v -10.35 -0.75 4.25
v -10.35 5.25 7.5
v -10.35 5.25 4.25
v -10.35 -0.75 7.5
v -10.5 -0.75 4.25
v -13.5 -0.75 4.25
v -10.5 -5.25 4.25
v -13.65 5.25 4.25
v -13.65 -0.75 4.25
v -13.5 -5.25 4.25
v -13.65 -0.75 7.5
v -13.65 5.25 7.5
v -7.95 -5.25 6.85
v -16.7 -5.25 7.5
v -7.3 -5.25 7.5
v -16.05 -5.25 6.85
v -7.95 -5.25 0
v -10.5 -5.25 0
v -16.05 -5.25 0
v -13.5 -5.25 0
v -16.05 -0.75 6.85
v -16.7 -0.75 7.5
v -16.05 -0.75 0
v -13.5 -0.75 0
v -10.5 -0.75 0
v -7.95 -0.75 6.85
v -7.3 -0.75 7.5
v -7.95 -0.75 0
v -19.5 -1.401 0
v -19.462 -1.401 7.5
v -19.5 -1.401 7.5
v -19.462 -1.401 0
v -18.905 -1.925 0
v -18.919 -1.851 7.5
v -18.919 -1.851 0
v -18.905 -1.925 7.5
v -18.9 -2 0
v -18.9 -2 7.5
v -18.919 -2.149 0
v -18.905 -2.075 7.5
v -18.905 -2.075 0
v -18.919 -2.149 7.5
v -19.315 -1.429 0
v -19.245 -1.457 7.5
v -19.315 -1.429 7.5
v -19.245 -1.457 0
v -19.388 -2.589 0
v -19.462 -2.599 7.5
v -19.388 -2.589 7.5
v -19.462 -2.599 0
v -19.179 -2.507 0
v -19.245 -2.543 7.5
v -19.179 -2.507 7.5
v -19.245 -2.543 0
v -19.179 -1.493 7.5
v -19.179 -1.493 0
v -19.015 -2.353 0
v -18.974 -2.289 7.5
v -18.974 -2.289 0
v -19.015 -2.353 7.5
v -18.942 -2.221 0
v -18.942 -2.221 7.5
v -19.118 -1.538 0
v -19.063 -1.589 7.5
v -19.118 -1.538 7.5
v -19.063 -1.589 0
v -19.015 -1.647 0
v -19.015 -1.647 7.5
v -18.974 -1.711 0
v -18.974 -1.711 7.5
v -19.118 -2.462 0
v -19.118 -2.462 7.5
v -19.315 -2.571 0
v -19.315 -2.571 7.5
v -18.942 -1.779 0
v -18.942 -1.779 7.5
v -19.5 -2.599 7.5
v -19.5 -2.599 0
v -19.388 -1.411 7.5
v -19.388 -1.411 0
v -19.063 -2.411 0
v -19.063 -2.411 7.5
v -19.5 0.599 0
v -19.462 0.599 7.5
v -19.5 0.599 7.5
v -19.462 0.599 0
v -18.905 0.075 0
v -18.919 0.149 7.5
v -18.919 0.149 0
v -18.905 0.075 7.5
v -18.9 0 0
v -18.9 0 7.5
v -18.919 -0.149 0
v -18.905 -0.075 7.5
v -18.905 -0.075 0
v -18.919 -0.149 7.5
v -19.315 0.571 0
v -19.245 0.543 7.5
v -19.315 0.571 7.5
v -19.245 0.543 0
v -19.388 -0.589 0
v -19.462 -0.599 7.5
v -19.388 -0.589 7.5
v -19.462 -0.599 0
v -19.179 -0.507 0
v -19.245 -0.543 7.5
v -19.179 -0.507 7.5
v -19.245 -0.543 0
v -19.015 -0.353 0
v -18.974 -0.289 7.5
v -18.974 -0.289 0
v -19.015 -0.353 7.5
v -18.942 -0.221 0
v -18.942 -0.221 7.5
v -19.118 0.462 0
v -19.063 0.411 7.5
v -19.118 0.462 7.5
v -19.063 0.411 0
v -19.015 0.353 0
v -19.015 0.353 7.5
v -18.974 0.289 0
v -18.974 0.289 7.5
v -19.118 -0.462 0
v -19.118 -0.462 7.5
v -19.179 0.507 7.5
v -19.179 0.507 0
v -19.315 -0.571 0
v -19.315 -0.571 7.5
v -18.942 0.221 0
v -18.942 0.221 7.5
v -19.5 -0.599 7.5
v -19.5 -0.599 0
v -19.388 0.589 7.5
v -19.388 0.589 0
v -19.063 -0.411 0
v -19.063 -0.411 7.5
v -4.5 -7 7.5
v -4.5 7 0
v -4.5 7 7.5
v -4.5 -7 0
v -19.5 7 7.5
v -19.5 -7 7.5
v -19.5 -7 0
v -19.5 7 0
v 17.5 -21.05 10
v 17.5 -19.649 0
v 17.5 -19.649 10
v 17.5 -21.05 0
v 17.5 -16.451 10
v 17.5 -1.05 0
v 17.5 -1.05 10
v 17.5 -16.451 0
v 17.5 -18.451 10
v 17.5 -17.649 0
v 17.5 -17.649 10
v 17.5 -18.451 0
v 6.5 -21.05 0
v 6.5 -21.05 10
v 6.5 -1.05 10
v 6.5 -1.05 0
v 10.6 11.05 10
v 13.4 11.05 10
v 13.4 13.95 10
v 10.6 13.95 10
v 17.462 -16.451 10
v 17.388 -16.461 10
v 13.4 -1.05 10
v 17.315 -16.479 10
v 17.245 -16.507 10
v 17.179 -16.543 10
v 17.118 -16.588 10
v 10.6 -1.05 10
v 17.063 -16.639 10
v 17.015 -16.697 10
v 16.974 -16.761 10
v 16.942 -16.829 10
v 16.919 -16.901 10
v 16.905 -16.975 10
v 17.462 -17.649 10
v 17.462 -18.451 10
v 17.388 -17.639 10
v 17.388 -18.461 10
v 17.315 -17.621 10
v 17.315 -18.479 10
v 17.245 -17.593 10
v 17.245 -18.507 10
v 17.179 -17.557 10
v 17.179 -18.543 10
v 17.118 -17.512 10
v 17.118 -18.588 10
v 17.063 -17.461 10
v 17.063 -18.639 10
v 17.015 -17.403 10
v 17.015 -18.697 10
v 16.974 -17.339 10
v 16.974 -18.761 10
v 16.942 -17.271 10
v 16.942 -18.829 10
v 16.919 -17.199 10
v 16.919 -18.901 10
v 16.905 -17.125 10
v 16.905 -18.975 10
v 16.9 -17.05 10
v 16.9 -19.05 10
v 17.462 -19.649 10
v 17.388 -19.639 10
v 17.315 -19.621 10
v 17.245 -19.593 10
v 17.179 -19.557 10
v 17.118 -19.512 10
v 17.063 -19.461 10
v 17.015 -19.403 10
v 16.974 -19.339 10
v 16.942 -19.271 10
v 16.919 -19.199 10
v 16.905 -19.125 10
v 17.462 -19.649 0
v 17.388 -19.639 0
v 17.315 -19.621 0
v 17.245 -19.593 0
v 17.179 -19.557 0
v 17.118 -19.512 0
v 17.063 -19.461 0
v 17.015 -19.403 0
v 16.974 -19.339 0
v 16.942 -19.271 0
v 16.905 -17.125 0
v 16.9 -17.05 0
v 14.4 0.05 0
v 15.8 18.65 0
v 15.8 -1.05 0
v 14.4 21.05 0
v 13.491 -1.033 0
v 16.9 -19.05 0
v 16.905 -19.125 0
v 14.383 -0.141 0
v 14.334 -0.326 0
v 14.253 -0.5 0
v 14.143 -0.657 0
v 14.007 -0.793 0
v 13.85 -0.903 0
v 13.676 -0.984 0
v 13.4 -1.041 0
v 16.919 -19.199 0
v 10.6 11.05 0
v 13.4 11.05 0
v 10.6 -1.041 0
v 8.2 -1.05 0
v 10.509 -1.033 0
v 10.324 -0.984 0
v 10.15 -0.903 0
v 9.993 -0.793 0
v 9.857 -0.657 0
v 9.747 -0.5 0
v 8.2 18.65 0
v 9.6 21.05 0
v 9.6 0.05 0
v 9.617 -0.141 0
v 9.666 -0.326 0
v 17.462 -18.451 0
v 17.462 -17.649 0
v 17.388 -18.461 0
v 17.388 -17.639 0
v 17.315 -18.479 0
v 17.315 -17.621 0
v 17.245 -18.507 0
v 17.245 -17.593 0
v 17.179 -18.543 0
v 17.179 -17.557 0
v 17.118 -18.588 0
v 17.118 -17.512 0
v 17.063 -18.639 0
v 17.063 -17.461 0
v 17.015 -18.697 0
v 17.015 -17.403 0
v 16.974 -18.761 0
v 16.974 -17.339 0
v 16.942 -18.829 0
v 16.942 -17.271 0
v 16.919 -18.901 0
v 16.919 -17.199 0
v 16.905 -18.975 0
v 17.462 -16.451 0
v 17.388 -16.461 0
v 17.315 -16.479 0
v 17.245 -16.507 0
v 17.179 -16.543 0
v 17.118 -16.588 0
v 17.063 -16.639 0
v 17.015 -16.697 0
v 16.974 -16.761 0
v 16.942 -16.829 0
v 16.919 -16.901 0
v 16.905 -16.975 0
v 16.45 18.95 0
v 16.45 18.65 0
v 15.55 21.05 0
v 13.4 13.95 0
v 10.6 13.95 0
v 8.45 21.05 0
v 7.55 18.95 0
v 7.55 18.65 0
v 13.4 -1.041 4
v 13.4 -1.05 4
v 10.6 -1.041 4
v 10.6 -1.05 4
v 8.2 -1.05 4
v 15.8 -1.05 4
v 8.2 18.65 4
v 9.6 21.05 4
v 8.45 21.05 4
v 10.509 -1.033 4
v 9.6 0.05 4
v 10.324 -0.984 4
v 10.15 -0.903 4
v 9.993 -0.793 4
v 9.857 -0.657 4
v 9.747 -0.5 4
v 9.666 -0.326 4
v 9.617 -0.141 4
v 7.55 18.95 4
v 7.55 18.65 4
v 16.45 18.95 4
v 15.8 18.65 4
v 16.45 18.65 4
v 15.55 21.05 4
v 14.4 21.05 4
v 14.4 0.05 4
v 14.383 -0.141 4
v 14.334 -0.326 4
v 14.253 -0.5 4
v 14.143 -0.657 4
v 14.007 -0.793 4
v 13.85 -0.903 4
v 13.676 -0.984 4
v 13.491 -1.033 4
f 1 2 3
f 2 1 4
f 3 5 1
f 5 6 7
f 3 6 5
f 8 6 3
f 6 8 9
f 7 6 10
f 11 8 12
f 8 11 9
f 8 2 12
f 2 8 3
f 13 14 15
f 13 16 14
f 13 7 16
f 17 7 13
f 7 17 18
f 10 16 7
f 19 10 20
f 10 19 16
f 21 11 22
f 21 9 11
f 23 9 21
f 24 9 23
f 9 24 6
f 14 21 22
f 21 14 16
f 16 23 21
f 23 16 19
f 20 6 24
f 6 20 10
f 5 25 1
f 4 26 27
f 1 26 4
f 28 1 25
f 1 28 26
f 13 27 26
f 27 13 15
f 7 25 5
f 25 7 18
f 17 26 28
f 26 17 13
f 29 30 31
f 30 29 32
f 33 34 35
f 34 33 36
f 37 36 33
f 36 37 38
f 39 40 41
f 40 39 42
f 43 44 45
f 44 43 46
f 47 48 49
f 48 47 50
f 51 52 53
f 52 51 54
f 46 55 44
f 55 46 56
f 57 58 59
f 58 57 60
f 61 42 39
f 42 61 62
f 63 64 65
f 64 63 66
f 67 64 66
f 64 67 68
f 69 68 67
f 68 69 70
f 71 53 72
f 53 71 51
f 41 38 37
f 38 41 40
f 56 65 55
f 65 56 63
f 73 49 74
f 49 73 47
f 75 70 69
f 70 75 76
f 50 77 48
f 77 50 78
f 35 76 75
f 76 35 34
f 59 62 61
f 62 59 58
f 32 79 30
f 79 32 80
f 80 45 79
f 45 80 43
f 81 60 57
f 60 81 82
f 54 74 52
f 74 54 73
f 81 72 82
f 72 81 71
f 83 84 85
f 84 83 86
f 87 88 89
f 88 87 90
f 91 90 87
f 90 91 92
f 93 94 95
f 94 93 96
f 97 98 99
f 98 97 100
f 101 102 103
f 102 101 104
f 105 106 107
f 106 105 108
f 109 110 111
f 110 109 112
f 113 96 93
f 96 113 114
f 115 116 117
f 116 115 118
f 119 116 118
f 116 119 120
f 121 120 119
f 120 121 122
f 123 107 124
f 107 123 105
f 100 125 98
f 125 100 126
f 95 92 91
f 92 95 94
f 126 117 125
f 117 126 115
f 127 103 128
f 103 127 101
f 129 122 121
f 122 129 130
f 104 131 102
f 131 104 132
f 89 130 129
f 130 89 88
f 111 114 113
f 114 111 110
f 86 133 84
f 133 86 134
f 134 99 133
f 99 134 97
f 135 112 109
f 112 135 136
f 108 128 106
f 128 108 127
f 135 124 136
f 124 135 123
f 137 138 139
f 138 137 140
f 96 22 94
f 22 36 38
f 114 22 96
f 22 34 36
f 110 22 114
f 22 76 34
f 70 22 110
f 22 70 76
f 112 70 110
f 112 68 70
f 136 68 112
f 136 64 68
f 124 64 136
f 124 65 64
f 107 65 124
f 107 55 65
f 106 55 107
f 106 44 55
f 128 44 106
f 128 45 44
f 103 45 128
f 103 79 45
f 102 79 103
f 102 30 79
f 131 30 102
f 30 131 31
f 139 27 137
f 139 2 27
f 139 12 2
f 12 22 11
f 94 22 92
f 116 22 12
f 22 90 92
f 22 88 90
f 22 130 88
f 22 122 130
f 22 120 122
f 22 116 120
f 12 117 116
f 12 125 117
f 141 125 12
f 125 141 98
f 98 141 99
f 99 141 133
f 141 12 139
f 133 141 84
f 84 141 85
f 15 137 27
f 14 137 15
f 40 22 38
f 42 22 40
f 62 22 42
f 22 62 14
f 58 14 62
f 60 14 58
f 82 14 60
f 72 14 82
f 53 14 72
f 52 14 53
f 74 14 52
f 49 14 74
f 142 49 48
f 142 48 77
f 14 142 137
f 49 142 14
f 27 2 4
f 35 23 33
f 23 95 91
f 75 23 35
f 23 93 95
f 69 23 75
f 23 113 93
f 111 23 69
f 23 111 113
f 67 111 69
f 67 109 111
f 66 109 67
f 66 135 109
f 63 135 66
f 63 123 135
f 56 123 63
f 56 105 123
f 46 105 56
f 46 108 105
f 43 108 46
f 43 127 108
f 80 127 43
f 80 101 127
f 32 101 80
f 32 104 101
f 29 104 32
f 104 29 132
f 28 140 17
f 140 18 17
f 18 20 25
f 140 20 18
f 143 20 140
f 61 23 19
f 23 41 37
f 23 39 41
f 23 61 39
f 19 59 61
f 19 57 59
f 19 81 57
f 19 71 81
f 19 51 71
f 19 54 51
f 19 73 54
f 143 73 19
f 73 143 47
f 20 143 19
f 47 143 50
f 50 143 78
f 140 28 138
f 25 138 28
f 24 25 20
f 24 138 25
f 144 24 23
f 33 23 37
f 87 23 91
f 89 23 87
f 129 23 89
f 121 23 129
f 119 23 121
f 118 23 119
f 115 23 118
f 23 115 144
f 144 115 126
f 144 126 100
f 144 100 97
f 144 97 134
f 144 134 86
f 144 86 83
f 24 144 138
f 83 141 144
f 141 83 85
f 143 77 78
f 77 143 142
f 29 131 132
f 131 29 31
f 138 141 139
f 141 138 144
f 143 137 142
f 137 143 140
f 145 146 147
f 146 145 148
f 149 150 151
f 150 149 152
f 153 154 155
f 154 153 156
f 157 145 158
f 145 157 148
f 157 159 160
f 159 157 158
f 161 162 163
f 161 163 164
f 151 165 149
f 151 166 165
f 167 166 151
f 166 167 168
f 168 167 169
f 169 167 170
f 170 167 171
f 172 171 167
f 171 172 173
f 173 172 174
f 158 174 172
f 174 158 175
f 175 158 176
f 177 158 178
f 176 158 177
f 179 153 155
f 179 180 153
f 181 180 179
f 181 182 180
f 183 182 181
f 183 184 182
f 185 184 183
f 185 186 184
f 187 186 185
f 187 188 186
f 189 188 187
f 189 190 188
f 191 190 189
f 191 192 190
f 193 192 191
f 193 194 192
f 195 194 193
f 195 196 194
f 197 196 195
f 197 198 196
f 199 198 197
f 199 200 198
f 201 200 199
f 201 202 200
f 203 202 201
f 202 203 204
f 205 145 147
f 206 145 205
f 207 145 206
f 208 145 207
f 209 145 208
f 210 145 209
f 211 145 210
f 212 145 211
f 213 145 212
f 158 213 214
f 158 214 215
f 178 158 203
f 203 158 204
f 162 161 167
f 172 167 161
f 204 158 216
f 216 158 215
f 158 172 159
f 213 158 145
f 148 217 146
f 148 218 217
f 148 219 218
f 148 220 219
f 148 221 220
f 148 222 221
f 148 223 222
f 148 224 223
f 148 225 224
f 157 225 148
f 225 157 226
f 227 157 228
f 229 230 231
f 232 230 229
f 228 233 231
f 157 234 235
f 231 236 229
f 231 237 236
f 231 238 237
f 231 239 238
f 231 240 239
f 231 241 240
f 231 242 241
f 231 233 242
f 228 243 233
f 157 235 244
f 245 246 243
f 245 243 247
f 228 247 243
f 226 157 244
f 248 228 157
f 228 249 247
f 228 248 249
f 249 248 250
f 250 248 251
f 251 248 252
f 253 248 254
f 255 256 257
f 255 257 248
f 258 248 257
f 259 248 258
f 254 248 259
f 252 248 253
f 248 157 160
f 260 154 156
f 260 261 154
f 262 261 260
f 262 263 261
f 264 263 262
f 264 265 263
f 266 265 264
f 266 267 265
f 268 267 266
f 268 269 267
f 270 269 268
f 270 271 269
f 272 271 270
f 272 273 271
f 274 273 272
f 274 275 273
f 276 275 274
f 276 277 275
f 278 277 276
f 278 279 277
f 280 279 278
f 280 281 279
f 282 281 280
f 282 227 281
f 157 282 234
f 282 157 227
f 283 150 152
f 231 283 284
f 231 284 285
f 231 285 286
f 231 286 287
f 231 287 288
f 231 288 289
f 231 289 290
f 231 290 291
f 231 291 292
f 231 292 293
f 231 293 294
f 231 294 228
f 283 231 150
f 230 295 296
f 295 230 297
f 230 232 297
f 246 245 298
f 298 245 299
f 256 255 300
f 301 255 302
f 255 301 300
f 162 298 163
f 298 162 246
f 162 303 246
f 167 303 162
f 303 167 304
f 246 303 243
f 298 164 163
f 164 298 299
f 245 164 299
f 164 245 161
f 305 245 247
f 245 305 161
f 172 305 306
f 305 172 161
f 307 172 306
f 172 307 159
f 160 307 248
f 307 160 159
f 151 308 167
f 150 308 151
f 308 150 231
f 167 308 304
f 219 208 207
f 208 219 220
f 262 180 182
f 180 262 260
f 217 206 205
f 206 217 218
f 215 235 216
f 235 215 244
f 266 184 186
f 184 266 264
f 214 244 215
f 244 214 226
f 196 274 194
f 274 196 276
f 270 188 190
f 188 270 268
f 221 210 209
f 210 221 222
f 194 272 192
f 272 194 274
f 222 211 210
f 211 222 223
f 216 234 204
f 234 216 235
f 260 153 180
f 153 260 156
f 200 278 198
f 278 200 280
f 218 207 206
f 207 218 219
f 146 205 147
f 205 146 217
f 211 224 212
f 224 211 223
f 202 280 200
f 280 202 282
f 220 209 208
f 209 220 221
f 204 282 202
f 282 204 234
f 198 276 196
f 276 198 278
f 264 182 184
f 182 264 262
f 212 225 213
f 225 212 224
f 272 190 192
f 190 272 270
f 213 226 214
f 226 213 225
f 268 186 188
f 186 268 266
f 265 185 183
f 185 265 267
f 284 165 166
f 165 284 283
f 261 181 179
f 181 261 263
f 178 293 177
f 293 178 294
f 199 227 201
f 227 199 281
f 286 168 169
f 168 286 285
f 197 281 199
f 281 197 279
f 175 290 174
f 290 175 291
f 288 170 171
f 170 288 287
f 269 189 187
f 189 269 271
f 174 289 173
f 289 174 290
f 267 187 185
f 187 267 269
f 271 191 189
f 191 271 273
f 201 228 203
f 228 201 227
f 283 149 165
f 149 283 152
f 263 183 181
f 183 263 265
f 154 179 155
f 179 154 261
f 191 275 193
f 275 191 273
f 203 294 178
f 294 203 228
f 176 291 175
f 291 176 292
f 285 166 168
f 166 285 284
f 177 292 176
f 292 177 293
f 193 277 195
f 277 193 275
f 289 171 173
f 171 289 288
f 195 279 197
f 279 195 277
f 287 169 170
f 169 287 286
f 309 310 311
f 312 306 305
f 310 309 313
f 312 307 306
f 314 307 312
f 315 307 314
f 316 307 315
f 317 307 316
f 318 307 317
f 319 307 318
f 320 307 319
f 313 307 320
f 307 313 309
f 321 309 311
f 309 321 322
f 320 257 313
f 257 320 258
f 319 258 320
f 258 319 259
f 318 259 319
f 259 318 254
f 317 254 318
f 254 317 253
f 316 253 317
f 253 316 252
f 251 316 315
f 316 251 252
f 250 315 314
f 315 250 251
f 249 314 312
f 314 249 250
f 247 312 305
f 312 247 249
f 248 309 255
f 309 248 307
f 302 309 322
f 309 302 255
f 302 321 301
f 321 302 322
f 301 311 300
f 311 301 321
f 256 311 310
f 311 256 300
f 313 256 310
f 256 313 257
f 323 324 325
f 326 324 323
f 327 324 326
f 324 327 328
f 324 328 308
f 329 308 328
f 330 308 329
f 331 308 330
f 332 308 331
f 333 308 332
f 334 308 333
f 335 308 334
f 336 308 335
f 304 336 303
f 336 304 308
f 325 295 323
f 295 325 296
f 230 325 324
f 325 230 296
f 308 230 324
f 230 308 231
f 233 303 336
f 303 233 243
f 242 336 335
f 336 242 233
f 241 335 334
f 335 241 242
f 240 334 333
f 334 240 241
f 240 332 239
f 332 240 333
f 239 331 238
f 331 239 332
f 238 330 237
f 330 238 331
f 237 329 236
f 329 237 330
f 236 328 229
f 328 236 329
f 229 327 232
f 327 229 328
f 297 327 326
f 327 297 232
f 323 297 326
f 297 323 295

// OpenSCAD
$fn = 50;

difference() {
	union() {
		translate(v = [-12, -5, 0]) {
			rotate(a = [0, 0, 0]) {
				difference() {
					union() {
						translate(v = [-7.5, -2.0, 0]) {
							cube(size = [15.0, 14.0, 7.5]);
						}
					}
					union() {
						translate(v = [-1.65, -0.25, 4.25]) {
							cube(size = [3.3, 10.5, 3.35]);
						}
						translate(v = [0, 4.25, 0]) {
							rotate(a = [90, 0, 0]) {
								linear_extrude(height = 4.5) {
									polygon(points = [[-1.5, -0.1], [-4.05, -0.1], [-4.05, 6.85], [-4.8, 7.6], [-0.75, 7.6], [-1.5, 6.85]]);
								}
							}
						}
						translate(v = [0, 4.25, 0]) {
							rotate(a = [90, 0, 0]) {
								linear_extrude(height = 4.5) {
									polygon(points = [[1.5, -0.1], [4.05, -0.1], [4.05, 6.85], [4.8, 7.6], [0.75, 7.6], [1.5, 6.85]]);
								}
							}
						}
						translate(v = [-7.5, 3, -0.1]) {
							cylinder(h = 7.7, r = 0.6);
						}
						translate(v = [-7.5, 5, -0.1]) {
							cylinder(h = 7.7, r = 0.6);
						}
					}
				}
			}
		}
		translate(v = [12, 10.95, 0]) {
			rotate(a = [90, 0, 0]) {
				union() {
					difference() {
						union() {
							translate(v = [-5.5, 0, 0]) {
								cube(size = [11.0, 10.0, 32.0]);
							}
							translate(v = [-1.4, 0, -3.0]) {
								cube(size = [2.8, 10.0, 3.1]);
							}
						}
						union() {
							translate(v = [-5.6, -0.1, -0.1]) {
								cube(size = [4.199999999999999, 10.2, 12.1]);
							}
							translate(v = [1.4, -0.1, -0.1]) {
								cube(size = [4.199999999999999, 10.2, 12.1]);
							}
							translate(v = [5.5, 10.1, 30.0]) {
								rotate(a = [90, 0, 0]) {
									cylinder(h = 10.2, r = 0.6);
								}
							}
							translate(v = [5.5, 10.1, 28.0]) {
								rotate(a = [90, 0, 0]) {
									cylinder(h = 10.2, r = 0.6);
								}
							}
						}
					}
					union() {
						translate(v = [0, 4.0, 0]) {
							rotate(a = [90, 0, 0]) {
								linear_extrude(height = 4.0) {
									polygon(points = [[-2.4, -10.1], [-3.55, -10.1], [-4.45, -8.0], [-4.45, -7.7], [-3.8, -7.7], [-3.8, 12.5], [-1.3, 12.5], [-1.3, 12.0], [-1.491013, 11.983289], [-1.676222, 11.933662], [-1.85, 11.852628], [-2.007066, 11.742649], [-2.142649, 11.607066], [-2.252628, 11.45], [-2.333662, 11.276222], [-2.383289, 11.091013], [-2.4, 10.9]]);
								}
							}
						}
						translate(v = [0, 4.0, 0]) {
							rotate(a = [90, 0, 0]) {
								linear_extrude(height = 4.0) {
									polygon(points = [[2.4, -10.1], [3.55, -10.1], [4.45, -8.0], [4.45, -7.7], [3.8, -7.7], [3.8, 12.5], [1.3, 12.5], [1.3, 12.0], [1.491013, 11.983289], [1.676222, 11.933662], [1.85, 11.852628], [2.007066, 11.742649], [2.142649, 11.607066], [2.252628, 11.45], [2.333662, 11.276222], [2.383289, 11.091013], [2.4, 10.9]]);
								}
							}
						}
					}
				}
			}
		}
	}
	union();
}
